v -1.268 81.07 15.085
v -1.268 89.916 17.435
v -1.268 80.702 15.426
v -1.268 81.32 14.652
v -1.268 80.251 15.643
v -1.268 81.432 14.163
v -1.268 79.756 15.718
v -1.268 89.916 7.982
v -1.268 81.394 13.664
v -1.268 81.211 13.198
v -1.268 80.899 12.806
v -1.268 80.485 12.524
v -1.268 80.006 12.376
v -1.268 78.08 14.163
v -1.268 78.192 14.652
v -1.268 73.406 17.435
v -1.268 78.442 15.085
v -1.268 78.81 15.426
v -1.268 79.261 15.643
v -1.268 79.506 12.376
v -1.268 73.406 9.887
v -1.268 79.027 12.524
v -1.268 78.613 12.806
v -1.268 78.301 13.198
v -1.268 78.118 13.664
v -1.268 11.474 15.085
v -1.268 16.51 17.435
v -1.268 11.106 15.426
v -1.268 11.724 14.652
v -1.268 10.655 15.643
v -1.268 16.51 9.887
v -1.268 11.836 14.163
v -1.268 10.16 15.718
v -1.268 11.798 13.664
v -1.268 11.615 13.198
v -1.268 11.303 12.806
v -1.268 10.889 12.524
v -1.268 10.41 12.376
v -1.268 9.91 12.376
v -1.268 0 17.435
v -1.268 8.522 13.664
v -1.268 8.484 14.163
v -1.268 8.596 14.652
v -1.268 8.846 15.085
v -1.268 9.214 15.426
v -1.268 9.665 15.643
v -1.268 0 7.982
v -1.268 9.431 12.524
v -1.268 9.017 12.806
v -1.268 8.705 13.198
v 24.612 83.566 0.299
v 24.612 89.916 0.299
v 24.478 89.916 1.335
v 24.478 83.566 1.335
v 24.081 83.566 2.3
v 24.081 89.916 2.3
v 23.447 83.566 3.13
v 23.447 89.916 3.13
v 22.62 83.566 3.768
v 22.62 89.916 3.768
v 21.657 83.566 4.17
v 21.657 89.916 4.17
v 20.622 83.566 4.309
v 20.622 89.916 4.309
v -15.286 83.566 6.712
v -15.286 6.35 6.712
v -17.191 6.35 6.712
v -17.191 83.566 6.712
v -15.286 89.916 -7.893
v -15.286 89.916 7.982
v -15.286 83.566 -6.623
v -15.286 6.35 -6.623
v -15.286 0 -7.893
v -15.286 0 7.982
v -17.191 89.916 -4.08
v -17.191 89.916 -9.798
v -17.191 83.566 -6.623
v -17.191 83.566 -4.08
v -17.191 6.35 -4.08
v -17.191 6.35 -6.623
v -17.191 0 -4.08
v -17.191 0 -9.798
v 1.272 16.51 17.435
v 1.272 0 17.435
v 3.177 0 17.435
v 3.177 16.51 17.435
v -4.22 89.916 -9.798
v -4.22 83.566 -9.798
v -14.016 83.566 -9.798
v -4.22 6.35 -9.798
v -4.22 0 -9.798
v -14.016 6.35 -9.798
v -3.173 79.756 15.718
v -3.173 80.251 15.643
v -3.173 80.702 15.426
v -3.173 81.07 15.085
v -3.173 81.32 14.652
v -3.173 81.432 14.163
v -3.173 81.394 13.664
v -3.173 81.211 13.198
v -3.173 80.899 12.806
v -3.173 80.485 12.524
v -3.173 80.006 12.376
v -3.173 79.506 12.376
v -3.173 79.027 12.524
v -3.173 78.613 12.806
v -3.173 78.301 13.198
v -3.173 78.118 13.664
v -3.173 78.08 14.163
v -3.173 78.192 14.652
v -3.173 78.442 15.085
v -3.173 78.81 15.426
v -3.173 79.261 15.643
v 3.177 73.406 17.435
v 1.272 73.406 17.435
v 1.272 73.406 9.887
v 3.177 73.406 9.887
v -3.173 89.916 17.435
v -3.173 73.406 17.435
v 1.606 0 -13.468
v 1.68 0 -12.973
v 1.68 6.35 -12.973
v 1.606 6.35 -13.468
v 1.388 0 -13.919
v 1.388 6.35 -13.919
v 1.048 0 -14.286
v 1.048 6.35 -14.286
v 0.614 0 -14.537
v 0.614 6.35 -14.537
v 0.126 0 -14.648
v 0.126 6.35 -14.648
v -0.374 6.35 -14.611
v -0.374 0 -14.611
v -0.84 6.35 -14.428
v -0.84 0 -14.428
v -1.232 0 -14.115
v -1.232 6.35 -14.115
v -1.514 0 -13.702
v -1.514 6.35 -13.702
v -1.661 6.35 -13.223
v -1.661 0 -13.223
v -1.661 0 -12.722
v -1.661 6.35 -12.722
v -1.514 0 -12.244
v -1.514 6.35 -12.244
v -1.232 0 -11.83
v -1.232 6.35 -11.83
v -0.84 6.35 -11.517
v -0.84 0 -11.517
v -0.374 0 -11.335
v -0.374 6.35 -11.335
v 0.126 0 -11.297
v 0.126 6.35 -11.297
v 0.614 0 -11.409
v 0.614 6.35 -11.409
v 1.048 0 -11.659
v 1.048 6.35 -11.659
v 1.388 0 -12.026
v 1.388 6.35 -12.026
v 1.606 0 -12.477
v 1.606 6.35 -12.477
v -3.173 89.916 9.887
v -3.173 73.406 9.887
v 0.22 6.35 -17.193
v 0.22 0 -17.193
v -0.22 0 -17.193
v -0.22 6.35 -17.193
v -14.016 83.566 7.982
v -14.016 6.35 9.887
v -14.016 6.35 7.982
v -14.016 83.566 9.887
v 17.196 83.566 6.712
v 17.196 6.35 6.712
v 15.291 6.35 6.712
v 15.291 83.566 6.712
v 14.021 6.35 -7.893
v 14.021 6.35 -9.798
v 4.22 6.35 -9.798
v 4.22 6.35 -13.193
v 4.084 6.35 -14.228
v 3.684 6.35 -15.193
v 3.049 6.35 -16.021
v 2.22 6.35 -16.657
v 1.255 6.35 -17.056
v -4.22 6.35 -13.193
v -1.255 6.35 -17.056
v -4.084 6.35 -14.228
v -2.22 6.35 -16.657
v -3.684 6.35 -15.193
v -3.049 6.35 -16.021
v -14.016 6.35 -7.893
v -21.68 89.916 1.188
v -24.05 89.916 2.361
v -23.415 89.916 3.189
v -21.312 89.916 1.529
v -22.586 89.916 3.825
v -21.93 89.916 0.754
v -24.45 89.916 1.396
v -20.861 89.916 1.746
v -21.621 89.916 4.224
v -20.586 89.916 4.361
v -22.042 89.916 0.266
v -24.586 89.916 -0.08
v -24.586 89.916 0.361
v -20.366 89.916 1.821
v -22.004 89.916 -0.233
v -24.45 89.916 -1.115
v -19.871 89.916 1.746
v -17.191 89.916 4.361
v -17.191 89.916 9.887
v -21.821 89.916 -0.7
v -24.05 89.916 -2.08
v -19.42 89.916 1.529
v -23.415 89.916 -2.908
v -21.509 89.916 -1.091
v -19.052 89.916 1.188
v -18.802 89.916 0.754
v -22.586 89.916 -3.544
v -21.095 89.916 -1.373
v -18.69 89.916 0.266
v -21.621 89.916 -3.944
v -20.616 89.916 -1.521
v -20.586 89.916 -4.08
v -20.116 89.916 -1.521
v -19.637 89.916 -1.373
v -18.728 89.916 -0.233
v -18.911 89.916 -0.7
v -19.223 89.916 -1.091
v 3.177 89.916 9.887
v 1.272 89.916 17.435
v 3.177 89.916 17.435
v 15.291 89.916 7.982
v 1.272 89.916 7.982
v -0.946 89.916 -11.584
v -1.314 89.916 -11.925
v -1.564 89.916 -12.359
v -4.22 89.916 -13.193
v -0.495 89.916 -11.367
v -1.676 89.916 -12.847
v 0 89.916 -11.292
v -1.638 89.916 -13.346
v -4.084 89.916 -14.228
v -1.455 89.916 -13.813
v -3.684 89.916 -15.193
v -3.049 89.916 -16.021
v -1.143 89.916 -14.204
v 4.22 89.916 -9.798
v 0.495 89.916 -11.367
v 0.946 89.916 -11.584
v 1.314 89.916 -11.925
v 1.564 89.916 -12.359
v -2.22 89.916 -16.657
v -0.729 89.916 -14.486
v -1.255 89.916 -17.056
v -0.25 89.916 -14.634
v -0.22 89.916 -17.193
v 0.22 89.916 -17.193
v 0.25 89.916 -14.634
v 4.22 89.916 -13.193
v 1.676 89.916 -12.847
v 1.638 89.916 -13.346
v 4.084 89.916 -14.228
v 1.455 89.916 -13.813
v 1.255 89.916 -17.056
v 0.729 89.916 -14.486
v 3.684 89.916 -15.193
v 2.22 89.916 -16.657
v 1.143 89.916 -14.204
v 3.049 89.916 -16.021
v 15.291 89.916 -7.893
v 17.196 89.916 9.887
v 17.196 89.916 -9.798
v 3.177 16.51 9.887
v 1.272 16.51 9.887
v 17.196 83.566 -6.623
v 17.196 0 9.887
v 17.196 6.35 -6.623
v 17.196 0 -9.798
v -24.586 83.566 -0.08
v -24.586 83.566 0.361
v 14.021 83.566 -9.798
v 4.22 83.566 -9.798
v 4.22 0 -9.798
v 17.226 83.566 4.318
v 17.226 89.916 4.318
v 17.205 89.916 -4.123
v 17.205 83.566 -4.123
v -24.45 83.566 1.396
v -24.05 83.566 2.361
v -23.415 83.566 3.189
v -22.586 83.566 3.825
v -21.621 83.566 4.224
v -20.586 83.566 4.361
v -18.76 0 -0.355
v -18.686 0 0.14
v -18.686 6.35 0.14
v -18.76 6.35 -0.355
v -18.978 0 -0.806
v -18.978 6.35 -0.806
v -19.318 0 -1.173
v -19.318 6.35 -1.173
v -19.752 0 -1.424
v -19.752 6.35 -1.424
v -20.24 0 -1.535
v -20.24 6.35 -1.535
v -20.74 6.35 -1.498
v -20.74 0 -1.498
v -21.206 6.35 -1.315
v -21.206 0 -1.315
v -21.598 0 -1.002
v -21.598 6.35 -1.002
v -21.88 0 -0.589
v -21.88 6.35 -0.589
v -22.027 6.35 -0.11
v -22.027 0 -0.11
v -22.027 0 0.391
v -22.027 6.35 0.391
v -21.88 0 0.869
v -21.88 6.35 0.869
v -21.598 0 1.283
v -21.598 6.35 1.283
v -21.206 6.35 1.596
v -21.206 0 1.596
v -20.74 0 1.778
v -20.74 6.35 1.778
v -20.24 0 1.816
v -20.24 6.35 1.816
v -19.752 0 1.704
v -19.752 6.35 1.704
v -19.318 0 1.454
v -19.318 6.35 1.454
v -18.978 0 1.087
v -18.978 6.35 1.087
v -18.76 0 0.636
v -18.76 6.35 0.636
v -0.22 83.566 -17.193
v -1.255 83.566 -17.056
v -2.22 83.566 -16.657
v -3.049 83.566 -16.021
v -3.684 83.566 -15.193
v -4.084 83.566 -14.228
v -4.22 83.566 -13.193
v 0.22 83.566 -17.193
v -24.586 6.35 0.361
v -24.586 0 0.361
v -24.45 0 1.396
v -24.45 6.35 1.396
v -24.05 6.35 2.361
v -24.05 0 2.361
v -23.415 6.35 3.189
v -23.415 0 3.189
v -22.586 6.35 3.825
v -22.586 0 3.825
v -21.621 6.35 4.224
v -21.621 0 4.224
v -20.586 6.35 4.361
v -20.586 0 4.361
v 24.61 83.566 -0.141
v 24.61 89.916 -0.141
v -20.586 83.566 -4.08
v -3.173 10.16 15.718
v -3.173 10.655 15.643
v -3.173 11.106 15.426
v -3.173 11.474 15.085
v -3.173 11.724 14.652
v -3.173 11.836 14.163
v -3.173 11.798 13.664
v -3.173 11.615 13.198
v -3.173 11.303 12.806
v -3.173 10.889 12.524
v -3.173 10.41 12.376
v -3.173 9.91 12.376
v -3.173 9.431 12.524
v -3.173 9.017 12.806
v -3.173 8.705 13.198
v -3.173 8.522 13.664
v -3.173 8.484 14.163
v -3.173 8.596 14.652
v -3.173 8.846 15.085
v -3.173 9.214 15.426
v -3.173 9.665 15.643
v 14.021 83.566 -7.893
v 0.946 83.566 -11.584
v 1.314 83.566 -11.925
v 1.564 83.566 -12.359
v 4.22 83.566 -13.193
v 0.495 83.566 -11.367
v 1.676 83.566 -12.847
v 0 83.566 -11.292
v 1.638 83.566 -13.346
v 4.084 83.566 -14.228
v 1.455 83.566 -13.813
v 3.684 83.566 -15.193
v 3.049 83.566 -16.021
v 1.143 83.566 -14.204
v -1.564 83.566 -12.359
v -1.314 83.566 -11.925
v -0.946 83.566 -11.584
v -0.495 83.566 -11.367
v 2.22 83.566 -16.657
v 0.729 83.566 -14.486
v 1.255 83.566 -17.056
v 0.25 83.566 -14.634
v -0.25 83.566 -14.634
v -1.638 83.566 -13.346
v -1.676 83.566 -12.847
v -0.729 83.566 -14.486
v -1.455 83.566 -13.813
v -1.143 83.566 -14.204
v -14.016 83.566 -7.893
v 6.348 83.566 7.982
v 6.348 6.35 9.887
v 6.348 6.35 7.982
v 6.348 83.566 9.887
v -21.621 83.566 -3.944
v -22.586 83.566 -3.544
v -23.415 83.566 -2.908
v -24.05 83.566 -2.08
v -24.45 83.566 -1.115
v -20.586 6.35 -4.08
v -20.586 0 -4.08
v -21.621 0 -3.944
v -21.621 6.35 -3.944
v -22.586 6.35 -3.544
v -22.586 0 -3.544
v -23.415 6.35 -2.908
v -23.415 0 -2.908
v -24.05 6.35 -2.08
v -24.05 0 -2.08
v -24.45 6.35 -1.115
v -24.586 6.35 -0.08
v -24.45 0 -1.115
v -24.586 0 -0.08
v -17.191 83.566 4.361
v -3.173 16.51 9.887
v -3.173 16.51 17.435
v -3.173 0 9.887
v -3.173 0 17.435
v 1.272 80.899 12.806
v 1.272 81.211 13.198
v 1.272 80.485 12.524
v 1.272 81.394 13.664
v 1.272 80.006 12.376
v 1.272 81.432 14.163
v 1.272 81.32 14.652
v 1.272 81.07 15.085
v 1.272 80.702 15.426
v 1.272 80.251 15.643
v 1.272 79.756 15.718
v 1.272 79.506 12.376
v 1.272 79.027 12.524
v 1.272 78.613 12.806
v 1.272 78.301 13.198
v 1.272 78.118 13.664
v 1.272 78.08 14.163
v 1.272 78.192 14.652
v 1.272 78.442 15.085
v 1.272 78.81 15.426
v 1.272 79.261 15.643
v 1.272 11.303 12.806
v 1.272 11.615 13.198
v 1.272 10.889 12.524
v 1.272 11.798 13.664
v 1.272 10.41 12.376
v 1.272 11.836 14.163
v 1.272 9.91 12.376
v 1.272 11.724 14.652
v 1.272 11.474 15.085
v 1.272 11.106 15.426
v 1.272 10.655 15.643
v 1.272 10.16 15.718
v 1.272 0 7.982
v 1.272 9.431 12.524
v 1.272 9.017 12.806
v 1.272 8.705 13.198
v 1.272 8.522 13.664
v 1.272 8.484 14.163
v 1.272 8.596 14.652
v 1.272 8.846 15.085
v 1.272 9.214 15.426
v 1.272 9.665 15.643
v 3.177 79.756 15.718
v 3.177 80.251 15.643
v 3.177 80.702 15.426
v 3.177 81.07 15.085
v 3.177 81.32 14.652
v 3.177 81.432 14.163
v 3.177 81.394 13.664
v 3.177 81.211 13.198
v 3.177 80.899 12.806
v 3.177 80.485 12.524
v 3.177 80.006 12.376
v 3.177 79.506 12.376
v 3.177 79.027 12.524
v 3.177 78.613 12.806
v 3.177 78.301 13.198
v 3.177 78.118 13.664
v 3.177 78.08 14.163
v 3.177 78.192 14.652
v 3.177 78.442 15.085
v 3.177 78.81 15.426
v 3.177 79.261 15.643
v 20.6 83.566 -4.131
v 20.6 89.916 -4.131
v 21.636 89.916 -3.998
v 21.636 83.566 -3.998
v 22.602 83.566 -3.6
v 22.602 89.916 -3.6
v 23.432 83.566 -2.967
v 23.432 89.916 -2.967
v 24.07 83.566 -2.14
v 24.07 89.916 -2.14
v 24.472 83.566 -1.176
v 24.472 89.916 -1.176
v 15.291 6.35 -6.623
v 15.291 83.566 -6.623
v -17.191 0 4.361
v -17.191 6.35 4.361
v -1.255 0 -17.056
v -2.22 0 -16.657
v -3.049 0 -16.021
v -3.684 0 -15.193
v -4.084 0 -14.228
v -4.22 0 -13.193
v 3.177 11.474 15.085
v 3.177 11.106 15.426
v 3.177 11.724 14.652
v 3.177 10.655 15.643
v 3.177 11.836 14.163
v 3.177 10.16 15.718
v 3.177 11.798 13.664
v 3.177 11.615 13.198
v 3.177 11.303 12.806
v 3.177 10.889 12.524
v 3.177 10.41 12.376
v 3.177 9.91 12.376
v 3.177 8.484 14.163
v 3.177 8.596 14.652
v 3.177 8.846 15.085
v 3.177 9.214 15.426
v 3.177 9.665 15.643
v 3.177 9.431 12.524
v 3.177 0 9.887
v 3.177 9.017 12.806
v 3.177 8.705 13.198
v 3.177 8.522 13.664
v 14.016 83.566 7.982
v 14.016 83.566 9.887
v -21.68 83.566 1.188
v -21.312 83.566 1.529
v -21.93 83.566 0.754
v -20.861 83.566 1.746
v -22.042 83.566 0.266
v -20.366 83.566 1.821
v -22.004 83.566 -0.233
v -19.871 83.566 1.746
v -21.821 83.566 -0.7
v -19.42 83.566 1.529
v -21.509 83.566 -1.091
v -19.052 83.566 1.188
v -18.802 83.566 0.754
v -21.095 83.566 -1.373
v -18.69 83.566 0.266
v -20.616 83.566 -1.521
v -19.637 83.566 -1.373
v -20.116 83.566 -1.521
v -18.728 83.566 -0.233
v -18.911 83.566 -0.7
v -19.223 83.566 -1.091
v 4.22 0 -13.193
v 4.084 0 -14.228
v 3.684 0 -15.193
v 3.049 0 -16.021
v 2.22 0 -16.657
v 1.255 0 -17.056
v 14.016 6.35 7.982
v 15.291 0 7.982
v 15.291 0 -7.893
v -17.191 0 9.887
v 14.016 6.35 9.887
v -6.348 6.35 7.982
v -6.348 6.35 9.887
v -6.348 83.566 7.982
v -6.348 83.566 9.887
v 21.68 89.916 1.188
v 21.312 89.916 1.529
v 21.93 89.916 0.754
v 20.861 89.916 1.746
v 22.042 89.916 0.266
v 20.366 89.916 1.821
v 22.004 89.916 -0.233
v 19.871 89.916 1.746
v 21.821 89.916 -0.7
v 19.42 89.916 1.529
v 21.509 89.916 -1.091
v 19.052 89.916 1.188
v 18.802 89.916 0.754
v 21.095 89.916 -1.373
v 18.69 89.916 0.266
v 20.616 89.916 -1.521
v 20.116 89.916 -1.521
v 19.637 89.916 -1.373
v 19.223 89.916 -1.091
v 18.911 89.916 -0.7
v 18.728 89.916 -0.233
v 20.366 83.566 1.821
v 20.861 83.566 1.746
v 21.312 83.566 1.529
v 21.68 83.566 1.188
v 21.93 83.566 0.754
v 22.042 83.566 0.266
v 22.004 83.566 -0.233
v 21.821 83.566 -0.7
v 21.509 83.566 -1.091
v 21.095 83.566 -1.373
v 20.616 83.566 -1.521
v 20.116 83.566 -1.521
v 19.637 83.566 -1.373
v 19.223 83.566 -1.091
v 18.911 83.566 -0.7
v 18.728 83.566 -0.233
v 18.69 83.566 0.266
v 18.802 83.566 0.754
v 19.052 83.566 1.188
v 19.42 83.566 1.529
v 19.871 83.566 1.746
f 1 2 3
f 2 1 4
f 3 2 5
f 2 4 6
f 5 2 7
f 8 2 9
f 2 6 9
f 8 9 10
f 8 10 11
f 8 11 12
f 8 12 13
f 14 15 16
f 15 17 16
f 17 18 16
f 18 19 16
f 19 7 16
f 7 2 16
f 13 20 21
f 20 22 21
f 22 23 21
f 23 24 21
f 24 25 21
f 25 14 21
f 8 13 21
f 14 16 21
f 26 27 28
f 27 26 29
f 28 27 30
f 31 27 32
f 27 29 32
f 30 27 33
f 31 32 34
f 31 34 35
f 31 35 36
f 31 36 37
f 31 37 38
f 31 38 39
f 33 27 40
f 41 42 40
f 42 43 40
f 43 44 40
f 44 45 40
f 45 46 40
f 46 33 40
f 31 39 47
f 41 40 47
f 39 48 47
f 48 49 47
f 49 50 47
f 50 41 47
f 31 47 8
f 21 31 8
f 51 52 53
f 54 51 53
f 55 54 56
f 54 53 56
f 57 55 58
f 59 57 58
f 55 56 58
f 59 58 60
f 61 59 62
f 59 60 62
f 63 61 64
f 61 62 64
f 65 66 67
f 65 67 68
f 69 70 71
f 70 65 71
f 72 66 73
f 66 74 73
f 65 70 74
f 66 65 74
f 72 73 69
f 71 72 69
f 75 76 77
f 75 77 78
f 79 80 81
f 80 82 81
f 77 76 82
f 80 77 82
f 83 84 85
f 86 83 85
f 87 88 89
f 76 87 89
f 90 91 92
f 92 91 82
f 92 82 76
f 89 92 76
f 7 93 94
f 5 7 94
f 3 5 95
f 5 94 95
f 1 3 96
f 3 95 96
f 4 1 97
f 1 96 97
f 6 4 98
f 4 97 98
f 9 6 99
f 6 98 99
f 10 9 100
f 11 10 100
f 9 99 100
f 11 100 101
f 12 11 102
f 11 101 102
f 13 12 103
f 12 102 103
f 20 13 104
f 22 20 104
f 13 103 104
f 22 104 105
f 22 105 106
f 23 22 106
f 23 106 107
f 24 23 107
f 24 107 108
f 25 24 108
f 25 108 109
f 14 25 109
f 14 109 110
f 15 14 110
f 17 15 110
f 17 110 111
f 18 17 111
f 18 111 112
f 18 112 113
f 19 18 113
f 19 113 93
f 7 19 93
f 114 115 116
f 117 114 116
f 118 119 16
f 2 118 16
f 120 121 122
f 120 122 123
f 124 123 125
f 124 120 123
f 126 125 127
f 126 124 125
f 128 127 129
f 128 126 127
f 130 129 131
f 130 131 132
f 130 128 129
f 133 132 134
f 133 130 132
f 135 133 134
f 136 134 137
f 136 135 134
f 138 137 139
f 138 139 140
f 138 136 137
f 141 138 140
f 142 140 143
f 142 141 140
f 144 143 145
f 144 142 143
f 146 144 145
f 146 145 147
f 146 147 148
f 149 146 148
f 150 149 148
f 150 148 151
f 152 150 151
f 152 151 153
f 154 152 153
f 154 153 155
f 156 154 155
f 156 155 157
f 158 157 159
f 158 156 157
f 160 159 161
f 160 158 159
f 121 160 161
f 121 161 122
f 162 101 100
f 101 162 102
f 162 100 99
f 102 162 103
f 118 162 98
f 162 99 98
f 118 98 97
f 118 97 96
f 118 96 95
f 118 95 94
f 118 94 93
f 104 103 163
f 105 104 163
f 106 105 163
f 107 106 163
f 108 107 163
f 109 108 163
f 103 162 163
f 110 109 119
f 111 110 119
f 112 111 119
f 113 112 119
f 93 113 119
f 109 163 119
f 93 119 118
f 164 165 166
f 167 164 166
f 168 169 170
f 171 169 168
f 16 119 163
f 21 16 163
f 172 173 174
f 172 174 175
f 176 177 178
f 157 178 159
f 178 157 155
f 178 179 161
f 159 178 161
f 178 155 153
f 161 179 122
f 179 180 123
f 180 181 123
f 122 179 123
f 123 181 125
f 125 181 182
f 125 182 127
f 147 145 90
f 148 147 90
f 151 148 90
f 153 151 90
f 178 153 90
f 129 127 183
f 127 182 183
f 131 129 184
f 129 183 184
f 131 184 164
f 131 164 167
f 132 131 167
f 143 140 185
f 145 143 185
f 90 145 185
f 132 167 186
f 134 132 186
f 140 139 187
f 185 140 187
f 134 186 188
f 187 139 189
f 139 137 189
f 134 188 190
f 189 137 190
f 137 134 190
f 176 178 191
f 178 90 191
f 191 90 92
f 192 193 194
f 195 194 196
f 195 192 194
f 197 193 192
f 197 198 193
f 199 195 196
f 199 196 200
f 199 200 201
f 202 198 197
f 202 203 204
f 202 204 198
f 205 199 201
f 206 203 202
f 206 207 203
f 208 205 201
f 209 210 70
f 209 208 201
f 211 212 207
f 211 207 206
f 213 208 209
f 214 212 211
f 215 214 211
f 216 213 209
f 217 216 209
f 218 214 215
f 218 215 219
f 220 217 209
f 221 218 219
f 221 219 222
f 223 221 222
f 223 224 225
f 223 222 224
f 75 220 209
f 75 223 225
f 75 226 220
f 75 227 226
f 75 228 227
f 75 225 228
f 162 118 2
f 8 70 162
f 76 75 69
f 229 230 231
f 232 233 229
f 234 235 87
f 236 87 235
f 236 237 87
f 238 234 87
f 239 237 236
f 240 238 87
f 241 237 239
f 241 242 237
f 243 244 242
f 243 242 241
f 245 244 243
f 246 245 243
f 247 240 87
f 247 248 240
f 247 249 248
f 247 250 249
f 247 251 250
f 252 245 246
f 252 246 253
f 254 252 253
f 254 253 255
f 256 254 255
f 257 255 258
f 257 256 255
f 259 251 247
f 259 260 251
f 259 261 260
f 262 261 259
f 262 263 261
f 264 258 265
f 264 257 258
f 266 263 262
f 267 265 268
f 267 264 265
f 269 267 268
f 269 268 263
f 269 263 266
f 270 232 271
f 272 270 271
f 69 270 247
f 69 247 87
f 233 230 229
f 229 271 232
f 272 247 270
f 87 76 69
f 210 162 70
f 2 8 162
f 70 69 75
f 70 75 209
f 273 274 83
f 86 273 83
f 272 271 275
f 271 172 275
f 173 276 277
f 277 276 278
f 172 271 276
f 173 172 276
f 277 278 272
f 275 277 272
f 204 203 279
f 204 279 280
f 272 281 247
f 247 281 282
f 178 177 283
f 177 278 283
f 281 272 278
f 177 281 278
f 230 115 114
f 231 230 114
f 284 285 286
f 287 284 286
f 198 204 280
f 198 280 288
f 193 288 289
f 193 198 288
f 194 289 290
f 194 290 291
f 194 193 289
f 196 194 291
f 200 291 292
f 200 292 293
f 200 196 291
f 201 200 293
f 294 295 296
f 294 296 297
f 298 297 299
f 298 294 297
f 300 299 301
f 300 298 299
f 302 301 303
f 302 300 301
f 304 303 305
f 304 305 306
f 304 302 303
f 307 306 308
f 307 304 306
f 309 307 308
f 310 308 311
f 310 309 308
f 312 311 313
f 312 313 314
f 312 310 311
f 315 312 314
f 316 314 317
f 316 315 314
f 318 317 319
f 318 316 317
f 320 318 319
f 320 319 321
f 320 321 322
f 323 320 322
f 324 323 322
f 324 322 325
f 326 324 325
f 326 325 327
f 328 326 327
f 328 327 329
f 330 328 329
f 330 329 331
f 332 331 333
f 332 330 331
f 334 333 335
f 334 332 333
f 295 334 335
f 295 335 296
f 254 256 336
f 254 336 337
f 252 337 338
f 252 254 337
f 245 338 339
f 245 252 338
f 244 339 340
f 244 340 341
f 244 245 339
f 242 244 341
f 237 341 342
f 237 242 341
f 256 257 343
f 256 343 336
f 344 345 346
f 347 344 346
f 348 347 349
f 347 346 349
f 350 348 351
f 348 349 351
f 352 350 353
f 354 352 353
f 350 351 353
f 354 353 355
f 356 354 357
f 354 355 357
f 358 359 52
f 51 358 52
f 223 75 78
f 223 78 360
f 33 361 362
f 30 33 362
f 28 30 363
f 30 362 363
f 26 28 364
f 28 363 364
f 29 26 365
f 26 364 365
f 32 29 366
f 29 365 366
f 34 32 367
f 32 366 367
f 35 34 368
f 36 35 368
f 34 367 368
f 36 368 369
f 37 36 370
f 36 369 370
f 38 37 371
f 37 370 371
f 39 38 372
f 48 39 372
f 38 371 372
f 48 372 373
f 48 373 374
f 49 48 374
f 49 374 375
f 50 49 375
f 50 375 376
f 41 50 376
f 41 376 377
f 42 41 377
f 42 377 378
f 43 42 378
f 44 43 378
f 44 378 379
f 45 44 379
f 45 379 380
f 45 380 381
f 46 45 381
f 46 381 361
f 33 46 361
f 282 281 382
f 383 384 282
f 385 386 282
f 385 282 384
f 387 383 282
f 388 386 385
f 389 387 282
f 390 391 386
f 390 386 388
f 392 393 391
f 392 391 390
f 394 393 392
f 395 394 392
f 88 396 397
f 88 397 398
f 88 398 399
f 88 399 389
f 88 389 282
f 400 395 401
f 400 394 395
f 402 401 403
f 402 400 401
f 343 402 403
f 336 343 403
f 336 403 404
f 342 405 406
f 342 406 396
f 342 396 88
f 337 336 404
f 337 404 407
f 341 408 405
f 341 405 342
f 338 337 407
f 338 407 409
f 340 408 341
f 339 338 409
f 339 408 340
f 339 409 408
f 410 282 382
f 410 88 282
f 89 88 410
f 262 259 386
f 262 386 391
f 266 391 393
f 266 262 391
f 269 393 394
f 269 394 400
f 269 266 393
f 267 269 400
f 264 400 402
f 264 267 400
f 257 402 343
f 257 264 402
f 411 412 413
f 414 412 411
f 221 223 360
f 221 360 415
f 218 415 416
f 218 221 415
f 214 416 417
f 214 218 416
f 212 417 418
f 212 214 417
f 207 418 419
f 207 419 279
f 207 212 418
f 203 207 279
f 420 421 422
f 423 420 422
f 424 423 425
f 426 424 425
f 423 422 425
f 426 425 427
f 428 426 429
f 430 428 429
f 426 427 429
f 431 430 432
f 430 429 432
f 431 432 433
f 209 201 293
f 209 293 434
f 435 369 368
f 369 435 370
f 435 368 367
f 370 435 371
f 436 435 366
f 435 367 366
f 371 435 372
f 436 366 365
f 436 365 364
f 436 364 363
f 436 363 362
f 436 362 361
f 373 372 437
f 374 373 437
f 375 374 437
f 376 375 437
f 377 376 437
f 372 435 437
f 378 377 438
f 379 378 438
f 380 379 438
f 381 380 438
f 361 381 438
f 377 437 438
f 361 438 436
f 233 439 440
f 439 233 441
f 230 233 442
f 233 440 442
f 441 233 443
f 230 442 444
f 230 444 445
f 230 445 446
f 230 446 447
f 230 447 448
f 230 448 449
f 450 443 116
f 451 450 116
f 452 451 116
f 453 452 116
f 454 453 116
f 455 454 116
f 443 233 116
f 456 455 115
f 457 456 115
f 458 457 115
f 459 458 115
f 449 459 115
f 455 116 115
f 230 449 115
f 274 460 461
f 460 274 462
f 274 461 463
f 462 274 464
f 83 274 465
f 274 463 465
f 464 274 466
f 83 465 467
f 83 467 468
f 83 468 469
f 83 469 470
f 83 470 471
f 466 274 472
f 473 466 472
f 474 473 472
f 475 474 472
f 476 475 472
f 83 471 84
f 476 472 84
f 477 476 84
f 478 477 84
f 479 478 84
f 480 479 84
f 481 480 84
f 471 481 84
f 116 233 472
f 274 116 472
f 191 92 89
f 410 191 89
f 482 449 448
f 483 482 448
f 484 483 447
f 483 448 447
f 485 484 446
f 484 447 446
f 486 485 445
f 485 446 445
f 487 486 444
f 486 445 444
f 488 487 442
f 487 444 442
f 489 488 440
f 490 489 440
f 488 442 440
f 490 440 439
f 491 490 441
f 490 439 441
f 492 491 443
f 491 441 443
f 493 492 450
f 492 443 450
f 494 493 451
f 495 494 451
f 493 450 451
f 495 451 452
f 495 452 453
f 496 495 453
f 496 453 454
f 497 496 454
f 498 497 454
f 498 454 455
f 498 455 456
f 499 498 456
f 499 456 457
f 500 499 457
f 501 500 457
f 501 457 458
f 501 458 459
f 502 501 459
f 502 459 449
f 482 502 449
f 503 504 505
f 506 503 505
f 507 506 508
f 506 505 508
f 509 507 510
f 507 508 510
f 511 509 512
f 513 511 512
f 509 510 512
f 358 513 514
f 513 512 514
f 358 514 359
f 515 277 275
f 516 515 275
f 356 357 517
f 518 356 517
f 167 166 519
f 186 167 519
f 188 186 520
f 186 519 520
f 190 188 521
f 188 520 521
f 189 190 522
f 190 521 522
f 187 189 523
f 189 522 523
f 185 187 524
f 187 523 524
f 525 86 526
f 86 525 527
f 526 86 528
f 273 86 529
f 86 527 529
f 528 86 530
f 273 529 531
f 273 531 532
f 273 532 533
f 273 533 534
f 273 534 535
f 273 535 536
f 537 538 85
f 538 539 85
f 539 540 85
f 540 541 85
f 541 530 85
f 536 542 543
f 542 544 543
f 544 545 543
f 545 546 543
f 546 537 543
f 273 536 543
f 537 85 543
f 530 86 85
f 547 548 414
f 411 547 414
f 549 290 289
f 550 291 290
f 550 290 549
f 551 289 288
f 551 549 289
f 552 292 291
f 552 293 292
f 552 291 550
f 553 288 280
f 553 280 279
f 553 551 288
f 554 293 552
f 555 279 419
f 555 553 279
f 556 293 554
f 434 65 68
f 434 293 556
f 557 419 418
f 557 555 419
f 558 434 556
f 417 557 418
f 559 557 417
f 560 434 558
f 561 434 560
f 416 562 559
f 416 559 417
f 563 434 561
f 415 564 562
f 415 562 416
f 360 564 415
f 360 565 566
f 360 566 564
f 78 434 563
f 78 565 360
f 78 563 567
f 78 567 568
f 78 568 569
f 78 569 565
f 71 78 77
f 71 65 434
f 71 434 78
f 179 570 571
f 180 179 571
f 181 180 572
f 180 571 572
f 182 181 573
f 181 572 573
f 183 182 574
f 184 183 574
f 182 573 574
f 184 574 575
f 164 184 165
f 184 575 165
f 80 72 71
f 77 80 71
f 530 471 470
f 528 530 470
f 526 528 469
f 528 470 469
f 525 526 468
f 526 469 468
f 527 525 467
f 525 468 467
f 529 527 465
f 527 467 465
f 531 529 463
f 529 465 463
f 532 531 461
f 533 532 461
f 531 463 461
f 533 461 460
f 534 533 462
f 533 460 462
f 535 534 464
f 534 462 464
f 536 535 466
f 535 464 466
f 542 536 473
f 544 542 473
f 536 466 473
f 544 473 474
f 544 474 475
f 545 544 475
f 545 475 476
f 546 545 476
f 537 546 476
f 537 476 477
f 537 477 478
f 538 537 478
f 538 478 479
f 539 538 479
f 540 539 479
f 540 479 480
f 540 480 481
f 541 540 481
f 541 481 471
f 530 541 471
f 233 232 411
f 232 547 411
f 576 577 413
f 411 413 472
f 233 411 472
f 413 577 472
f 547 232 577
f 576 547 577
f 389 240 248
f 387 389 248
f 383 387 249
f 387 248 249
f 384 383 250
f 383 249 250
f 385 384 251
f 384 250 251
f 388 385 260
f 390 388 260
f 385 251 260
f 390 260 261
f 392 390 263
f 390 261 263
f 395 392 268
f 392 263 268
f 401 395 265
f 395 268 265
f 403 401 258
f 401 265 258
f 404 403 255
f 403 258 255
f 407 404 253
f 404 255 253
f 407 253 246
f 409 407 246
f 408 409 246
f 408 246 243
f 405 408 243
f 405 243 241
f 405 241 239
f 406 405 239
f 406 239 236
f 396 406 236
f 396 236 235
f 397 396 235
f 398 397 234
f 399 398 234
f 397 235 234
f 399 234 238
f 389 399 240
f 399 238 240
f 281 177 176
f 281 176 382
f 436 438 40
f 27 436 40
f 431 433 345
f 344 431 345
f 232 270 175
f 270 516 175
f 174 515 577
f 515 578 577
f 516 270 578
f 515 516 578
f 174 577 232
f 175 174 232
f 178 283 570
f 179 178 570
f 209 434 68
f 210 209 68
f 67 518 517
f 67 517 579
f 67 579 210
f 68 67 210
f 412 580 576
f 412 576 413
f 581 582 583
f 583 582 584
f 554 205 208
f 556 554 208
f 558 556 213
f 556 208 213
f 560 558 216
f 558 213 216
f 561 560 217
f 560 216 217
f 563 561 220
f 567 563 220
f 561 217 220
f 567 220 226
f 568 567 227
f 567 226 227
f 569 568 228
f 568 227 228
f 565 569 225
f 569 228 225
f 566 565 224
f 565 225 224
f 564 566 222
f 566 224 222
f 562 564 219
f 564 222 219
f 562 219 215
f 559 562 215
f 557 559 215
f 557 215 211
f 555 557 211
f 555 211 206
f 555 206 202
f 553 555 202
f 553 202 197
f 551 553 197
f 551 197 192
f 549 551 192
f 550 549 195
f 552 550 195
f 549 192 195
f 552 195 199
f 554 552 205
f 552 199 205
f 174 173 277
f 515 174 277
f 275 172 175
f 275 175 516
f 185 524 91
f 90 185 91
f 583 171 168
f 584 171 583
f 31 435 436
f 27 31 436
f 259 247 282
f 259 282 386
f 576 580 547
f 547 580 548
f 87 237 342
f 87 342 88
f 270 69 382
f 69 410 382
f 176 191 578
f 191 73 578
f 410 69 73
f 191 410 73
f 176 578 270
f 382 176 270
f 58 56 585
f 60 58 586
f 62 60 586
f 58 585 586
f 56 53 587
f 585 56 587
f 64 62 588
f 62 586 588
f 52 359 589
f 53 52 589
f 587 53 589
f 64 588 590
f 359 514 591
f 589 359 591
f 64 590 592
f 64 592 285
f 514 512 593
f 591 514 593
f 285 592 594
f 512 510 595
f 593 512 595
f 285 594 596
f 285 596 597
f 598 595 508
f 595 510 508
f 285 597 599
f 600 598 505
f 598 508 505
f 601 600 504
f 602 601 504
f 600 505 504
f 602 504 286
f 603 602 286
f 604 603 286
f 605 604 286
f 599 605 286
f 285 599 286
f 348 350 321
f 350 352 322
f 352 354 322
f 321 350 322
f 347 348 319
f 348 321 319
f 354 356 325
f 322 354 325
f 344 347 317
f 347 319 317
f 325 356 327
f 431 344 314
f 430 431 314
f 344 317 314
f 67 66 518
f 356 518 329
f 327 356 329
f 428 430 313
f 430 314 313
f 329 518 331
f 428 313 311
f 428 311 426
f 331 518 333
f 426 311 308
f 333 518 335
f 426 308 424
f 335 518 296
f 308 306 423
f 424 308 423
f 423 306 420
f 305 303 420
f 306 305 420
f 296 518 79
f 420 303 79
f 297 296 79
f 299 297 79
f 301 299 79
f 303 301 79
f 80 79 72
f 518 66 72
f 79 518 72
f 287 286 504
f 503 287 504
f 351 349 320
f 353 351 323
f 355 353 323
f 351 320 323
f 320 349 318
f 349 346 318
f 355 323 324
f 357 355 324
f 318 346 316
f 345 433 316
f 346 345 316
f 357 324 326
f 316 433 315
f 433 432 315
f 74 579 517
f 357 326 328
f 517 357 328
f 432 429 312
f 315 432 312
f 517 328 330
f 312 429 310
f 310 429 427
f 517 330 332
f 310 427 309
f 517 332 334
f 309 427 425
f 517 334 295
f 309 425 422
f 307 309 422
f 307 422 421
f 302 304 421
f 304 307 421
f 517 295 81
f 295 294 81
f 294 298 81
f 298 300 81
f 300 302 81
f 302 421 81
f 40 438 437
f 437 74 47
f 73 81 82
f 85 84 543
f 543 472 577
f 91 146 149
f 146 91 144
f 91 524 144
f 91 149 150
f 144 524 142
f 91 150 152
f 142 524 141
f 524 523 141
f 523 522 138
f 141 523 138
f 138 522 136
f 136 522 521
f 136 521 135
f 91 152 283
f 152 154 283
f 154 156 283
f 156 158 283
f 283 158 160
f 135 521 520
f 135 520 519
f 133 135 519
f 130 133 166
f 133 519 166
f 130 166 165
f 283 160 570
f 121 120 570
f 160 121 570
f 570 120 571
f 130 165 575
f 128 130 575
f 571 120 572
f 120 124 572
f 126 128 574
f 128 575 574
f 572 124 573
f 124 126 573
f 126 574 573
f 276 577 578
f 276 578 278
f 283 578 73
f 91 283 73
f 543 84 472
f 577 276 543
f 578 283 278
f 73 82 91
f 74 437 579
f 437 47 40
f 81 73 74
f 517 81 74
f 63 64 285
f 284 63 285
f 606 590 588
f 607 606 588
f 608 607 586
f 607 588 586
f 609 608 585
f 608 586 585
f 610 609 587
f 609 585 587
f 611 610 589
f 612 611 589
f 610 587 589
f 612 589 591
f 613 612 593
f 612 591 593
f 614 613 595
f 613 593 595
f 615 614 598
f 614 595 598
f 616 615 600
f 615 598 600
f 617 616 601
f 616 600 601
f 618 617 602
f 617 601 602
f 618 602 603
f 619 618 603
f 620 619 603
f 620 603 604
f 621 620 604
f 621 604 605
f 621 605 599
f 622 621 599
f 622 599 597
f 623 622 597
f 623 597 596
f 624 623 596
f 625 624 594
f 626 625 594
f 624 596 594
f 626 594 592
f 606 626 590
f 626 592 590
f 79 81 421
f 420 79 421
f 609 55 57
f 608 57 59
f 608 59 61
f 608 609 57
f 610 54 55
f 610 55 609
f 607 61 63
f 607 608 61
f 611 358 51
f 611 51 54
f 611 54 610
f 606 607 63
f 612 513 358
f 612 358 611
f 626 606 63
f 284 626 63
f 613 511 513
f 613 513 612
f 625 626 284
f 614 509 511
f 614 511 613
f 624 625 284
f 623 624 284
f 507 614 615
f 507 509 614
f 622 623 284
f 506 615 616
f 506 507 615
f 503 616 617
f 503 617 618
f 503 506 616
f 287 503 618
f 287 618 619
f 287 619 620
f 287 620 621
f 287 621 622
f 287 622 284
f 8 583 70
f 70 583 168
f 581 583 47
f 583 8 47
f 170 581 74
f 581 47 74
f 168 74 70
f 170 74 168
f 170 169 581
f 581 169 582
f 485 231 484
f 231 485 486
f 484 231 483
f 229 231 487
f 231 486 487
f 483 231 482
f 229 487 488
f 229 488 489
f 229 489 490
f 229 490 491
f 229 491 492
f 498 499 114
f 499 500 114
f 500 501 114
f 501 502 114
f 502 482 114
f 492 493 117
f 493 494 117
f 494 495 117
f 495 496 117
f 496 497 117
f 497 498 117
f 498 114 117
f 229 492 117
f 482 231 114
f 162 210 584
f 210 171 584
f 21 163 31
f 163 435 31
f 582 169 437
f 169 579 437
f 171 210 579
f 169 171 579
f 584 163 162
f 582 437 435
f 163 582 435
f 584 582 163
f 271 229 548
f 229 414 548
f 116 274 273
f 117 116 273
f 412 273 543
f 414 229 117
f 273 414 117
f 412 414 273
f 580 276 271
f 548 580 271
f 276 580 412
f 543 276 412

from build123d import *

# Parameters (mm, degrees)
BOSS_EXTRUDE1_DEPTH = 89.916
SKETCH2_W           = 28.036759992
SKETCH2_H           = 77.216
CUT_EXTRUDE1_DEPTH  = 1.905
SKETCH4_R           = 1.68021
CUT_EXTRUDE2_DEPTH  = 41.916
SKETCH5_R           = 1.68021
BOSS_EXTRUDE2_DEPTH = 6.35
SKETCH6_W           = 7.668379996
SKETCH6_H           = 77.216
CUT_EXTRUDE3_DEPTH  = 2.54
CUT_EXTRUDE4_DEPTH  = 12.7
SKETCH8_W           = 13.335
SKETCH8_H           = 77.216
CUT_EXTRUDE5_DEPTH  = 43.18
LPATTERN1_OUTLINE_R = 1.68021
LPATTERN1_DEPTH     = 6.35


# Read off the part's stored shape, not the designer's step: LPattern1
with BuildPart() as part:
    # Sketch1 → Boss-Extrude1 (new body)
    with BuildSketch(Plane(origin=(0, 0, 0), x_dir=(1, 0, 0), z_dir=(0, 1, 0))):
        Polygon((-15.28599651, -7.274771053), (-15.28599651, -0.044914733), (-15.28599651, 7.184941588), (-15.28599651, 7.892585267), (15.290763482, 7.892585267), (15.290763482, 7.184941588), (15.290763482, -7.274771053), (15.290763482, -7.982414733), (1.272383486, -7.982414733), (1.272383486, -17.434771053), (3.177383486, -17.434771053), (3.177383486, -9.887414733), (17.195763482, -9.887414733), (17.195763482, -7.982414733), (17.195763482, 9.797585267), (-15.28599651, 9.797585267), (-17.19099651, 9.797585267), (-17.19099651, -9.887414733), (-3.172616514, -9.887414733), (-3.172616514, -10.640741484), (-3.172616514, -17.434771053), (-1.267616514, -17.434771053), (-1.267616514, -7.982414733), (-15.28599651, -7.982414733), align=None)
    extrude(amount=BOSS_EXTRUDE1_DEPTH)

    # Sketch2 → Cut-Extrude1 (cut)
    with BuildSketch(Plane(origin=(0, 0, -9.797585267), x_dir=(-1, 0, 0), z_dir=(0, 0, -1))):
        with Locations((-0.002383486, 44.958)):
            Rectangle(SKETCH2_W, SKETCH2_H)
    extrude(amount=-CUT_EXTRUDE1_DEPTH, mode=Mode.SUBTRACT)

    # Sketch4 → Cut-Extrude2 (cut)
    with BuildSketch(Plane.ZY.offset(3.172616514)):
        with Locations((14.037756268, 10.16)):
            Circle(SKETCH4_R)
        with Locations((14.037756268, 79.756)):
            Circle(SKETCH4_R)
    extrude(amount=-CUT_EXTRUDE2_DEPTH, mode=Mode.SUBTRACT)

    # Sketch5 → Boss-Extrude2 (add)
    # profile 1 of 3: a face of its own
    with BuildSketch(Plane(origin=(0, 89.916, 0), x_dir=(1, 0, 0), z_dir=(0, 1, 0))):
        with BuildLine():
            Line((-24.58620651, 0.079810052), (-24.58620651, -0.360609948))
            ThreePointArc((-24.58620651, -0.360609948), (-23.414633635, -3.189037073), (-20.58620651, -4.360609948))
            Line((-20.58620651, -4.360609948), (-17.19099651, -4.360609948))
            Line((-17.19099651, -4.360609948), (-17.19099651, 4.079810052))
            Line((-17.19099651, 4.079810052), (-20.58620651, 4.079810052))
            ThreePointArc((-20.58620651, 4.079810052), (-23.414633635, 2.908237176), (-24.58620651, 0.079810052))
        make_face()
        with Locations(Location((-20.36599651, -0.140399948, 0), (0, 0, 270))):
            Circle(SKETCH5_R, mode=Mode.SUBTRACT)
    # profile 2 of 3: a face of its own
    with BuildSketch(Plane(origin=(0, 89.916, 0), x_dir=(1, 0, 0), z_dir=(0, 1, 0))):
        with BuildLine():
            Line((-4.22021, 13.192795267), (-4.22021, 9.797585267))
            Line((-4.22021, 9.797585267), (4.22021, 9.797585267))
            Line((4.22021, 9.797585267), (4.22021, 13.192795267))
            ThreePointArc((4.22021, 13.192795267), (3.048637125, 16.021222392), (0.22021, 17.192795267))
            Line((0.22021, 17.192795267), (-0.22021, 17.192795267))
            ThreePointArc((-0.22021, 17.192795267), (-3.048637125, 16.021222392), (-4.22021, 13.192795267))
        make_face()
        with Locations(Location((0, 12.972585267, 0), (0, 0, 270))):
            Circle(SKETCH5_R, mode=Mode.SUBTRACT)
    # profile 3 of 3: a face of its own
    with BuildSketch(Plane(origin=(0, 89.916, 0), x_dir=(1, 0, 0), z_dir=(0, 1, 0))):
        with BuildLine():
            ThreePointArc((20.600449894, 4.13134171), (23.431799841, 2.966850199), (24.610446744, 0.141363607))
            Line((24.610446744, 0.141363607), (24.611548826, -0.299055014))
            ThreePointArc((24.611548826, -0.299055014), (23.447057315, -3.130404961), (20.621570723, -4.309051864))
            Line((20.621570723, -4.309051864), (17.226371353, -4.317547845))
            Line((17.226371353, -4.317547845), (17.205250524, 4.122845729))
            Line((17.205250524, 4.122845729), (20.600449894, 4.13134171))
        make_face()
        with Locations(Location((20.36599651, -0.140399948, 0), (0, 0, 270))):
            Circle(SKETCH5_R, mode=Mode.SUBTRACT)
    extrude(amount=-BOSS_EXTRUDE2_DEPTH)


with BuildPart() as boss_extrude2_piece_1:
    # of the separate pieces the step leaves, piece 1, a body of its own (boss_extrude2_pieces)
    add(part.part.solids().sort_by_distance((-17.19099651, 0, -9.797585267))[0])

    # Sketch6 → Cut-Extrude3 (cut)
    with BuildSketch(Plane.XY.offset(9.887414733)):
        with Locations((-10.181806512, 44.958)):
            Rectangle(SKETCH6_W, SKETCH6_H)
    cut_extrude3 = extrude(amount=-CUT_EXTRUDE3_DEPTH, mode=Mode.SUBTRACT)

    # Mirror1: Cut-Extrude3 across plane
    add(cut_extrude3.mirror(Plane(origin=(0, 0, 0), x_dir=(0, 0, 1), z_dir=(1, 0, 0))), mode=Mode.SUBTRACT)

    # Sketch7 → Cut-Extrude4 (cut)
    with BuildSketch(Plane.ZY.offset(3.172616514)):
        Polygon((17.434771053, 73.406), (14.037756268, 73.406), (9.887414733, 73.406), (9.887414733, 16.51), (14.037756268, 16.51), (17.434771053, 16.51), align=None)
    extrude(amount=-CUT_EXTRUDE4_DEPTH, mode=Mode.SUBTRACT)

    # Sketch8 → Cut-Extrude5 (cut)
    with BuildSketch(Plane(origin=(17.195763482, 0, 0), x_dir=(0, 0, -1), z_dir=(1, 0, 0))):
        with Locations((-0.044914733, 44.958)):
            Rectangle(SKETCH8_W, SKETCH8_H)
    extrude(amount=-CUT_EXTRUDE5_DEPTH, mode=Mode.SUBTRACT)

    # LPattern1 outline → LPattern1 (add)
    # profile 1 of 2: a face of its own
    with BuildSketch(Plane(origin=(0, 0, 0), x_dir=(1, 0, 0), z_dir=(0, 1, 0))):
        with BuildLine():
            Line((-4.22021, 13.192795267), (-4.22021, 9.797585267))
            Line((-4.22021, 9.797585267), (4.22021, 9.797585267))
            Line((4.22021, 9.797585267), (4.22021, 13.192795267))
            ThreePointArc((4.22021, 13.192795267), (3.048637125, 16.021222392), (0.22021, 17.192795267))
            Line((0.22021, 17.192795267), (-0.22021, 17.192795267))
            ThreePointArc((-0.22021, 17.192795267), (-3.048637125, 16.021222392), (-4.22021, 13.192795267))
        make_face()
        with Locations((0, 12.972585267)):
            Circle(LPATTERN1_OUTLINE_R, mode=Mode.SUBTRACT)
    # profile 2 of 2: a face of its own
    with BuildSketch(Plane(origin=(0, 0, 0), x_dir=(1, 0, 0), z_dir=(0, 1, 0))):
        with BuildLine():
            Line((-17.19099651, 4.079810052), (-20.58620651, 4.079810052))
            ThreePointArc((-20.58620651, 4.079810052), (-23.414633634, 2.908237177), (-24.58620651, 0.079810052))
            Line((-24.58620651, 0.079810052), (-24.58620651, -0.360609948))
            ThreePointArc((-24.58620651, -0.360609948), (-23.414633635, -3.189037073), (-20.58620651, -4.360609948))
            Line((-20.58620651, -4.360609948), (-17.19099651, -4.360609948))
            Line((-17.19099651, -4.360609948), (-17.19099651, 4.079810052))
        make_face()
        with Locations((-20.36599651, -0.140399948)):
            Circle(LPATTERN1_OUTLINE_R, mode=Mode.SUBTRACT)
    extrude(amount=LPATTERN1_DEPTH)


with BuildPart() as boss_extrude2_piece_2:
    # of the separate pieces the step leaves, piece 2, a body of its own (boss_extrude2_pieces)
    add(part.part.solids().sort_by_distance((20.600449894, 89.916, -4.13134171))[0])


solid = Compound([boss_extrude2_piece_1.part, boss_extrude2_piece_2.part])
